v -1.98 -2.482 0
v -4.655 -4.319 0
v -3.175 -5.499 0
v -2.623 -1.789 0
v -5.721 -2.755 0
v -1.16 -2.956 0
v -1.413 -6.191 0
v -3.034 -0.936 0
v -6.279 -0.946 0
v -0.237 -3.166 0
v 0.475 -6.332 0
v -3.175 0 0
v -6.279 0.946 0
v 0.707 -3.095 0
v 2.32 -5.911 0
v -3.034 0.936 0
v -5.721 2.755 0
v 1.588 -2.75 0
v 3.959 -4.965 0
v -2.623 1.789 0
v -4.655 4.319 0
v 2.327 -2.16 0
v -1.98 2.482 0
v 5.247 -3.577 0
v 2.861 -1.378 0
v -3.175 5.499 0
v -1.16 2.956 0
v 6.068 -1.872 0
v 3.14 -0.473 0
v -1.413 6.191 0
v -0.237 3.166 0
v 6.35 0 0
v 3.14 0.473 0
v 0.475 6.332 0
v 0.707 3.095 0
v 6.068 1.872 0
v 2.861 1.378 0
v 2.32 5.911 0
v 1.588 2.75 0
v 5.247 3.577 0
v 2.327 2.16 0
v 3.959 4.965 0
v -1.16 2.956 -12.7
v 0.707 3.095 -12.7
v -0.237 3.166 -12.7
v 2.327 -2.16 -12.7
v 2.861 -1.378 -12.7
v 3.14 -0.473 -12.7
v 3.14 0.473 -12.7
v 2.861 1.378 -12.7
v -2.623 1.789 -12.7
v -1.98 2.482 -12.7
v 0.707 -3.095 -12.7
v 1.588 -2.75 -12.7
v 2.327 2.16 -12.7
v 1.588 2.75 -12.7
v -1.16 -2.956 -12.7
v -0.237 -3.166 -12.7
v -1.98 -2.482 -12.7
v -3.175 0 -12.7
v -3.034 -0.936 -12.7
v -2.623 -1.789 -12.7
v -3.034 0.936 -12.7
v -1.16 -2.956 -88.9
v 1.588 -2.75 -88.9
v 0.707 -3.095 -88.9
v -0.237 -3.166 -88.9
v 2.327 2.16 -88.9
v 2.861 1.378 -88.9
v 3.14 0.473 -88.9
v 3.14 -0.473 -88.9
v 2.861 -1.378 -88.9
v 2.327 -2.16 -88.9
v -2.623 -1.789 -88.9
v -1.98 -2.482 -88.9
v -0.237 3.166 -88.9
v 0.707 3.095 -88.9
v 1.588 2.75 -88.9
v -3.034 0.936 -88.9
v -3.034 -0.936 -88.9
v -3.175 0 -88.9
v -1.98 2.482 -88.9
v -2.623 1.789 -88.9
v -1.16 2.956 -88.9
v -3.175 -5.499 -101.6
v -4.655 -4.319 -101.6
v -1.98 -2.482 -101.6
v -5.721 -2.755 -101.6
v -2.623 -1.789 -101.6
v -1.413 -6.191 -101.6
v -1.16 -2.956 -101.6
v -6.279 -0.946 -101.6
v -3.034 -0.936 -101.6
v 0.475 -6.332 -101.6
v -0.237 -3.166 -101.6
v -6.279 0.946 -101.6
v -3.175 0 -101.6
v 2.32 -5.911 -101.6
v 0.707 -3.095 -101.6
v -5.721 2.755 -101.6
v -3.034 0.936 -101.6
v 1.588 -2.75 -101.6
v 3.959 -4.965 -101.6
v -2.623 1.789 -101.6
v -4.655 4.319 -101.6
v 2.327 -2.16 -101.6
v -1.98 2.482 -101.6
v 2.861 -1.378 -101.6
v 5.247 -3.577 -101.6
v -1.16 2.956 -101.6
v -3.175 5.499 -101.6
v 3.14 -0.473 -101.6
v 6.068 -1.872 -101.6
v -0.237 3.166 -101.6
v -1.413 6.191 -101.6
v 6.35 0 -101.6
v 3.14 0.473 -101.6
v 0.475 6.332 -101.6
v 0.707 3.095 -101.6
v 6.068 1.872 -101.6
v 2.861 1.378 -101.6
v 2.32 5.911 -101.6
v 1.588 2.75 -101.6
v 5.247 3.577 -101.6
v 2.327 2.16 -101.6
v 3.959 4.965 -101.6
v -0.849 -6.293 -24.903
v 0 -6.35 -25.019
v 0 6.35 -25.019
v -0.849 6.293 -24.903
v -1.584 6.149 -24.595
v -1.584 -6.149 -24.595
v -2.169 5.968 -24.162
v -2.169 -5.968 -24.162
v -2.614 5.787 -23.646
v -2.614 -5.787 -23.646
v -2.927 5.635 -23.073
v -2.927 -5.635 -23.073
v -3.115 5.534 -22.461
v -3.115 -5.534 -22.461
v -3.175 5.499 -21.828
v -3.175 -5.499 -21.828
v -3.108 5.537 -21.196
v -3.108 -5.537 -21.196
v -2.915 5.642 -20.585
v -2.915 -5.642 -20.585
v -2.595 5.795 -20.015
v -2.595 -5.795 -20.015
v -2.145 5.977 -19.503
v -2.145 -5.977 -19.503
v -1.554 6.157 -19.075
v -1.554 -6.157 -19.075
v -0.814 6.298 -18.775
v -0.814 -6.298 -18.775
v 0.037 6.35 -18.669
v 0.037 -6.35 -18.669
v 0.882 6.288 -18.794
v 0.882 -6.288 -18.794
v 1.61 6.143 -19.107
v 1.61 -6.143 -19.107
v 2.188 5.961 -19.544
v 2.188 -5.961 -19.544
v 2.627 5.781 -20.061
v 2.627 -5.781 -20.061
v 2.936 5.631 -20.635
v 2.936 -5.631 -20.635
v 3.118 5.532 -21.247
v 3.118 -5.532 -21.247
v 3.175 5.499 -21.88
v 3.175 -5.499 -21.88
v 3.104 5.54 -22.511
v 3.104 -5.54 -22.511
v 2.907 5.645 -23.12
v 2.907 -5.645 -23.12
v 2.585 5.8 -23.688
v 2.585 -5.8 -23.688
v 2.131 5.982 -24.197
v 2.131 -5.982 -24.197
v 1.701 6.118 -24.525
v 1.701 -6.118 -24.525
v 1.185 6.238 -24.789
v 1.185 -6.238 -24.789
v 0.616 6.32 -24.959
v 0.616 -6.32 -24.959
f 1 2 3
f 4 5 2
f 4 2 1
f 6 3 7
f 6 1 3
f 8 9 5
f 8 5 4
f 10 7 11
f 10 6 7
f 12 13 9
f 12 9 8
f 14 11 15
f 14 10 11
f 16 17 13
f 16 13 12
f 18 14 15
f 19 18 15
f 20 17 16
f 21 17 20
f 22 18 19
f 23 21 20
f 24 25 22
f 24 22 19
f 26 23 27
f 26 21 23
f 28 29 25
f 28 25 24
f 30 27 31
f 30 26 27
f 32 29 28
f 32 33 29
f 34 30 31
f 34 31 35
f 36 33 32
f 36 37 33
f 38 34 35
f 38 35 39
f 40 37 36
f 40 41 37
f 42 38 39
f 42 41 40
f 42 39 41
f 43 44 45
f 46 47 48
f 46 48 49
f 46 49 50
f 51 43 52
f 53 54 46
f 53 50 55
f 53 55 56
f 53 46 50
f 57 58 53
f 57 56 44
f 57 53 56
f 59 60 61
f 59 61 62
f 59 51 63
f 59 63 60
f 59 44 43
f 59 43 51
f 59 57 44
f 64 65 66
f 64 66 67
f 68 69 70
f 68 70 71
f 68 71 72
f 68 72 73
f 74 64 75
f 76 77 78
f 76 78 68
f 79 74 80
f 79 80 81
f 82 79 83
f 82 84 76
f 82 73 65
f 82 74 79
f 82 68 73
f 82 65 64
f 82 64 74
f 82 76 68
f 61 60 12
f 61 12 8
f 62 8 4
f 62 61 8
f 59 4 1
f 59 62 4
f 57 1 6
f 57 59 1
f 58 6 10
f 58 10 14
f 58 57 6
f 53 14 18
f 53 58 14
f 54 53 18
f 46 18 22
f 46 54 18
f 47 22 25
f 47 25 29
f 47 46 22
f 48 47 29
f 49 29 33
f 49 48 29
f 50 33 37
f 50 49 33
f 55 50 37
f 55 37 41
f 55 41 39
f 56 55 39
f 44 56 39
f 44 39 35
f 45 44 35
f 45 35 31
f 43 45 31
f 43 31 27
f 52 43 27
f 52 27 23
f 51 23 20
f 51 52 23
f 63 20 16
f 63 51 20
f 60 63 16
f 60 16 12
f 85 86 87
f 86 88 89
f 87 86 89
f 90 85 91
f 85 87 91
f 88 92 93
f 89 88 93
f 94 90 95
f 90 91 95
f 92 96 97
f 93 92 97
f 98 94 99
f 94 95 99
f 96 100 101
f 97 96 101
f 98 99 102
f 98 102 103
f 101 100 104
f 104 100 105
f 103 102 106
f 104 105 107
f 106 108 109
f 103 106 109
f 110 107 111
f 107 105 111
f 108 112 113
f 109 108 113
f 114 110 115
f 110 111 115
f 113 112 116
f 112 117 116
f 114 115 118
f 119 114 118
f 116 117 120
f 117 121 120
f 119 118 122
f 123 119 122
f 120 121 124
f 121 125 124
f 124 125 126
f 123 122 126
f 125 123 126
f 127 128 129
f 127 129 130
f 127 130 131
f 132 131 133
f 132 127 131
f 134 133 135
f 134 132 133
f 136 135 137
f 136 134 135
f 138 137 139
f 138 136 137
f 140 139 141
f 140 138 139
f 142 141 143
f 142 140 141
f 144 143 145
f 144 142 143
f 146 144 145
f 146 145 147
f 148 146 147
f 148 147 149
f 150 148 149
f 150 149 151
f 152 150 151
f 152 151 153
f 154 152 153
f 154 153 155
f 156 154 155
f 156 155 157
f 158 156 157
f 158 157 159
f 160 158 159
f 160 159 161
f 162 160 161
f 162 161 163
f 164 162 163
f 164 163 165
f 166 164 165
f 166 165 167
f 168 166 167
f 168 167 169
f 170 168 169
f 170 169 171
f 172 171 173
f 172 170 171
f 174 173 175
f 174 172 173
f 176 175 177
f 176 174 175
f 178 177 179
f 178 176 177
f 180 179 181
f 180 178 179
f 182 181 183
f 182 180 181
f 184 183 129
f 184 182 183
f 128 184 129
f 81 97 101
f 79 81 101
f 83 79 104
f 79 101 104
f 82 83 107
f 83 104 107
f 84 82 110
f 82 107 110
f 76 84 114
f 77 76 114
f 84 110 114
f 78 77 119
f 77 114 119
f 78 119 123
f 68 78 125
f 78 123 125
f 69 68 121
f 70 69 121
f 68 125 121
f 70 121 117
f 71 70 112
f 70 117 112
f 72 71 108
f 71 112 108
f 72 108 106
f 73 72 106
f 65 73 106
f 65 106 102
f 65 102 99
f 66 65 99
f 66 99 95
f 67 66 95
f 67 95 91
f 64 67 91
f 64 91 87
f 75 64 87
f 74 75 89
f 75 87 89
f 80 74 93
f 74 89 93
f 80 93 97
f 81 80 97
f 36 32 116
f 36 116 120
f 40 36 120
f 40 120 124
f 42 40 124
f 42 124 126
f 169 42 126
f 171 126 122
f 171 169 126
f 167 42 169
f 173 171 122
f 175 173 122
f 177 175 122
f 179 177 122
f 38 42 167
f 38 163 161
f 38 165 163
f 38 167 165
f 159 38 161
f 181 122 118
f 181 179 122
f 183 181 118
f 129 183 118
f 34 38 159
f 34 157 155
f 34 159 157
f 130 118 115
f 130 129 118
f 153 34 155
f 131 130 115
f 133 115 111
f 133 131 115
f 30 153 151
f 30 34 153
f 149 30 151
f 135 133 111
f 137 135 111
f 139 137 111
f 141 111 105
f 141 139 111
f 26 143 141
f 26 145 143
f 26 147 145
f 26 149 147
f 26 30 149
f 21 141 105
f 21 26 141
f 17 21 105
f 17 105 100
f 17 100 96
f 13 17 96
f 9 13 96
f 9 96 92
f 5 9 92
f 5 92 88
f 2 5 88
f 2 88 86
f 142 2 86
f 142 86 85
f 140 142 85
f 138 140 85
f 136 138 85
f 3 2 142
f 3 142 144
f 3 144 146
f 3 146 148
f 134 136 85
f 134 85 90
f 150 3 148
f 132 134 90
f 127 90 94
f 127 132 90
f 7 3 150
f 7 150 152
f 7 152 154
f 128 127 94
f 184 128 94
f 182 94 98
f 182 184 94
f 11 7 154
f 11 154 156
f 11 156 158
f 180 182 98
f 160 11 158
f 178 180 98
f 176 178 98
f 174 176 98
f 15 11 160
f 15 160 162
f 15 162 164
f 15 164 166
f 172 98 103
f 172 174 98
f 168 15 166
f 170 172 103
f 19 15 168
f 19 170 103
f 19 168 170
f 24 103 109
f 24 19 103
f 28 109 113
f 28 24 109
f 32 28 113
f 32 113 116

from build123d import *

# Parameters (mm, degrees)
SKETCH1_R               = 6.35
BOSS_EXTRUDE1_DEPTH     = 101.6
SKETCH7_R               = 3.175
CUT_EXTRUDE4_DEPTH      = 12.7
CUT_EXTRUDE5_DEPTH      = 7.62
CUT_EXTRUDE5_DEPTH_BACK = 8.636
SKETCH10_R              = 3.175
CUT_EXTRUDE6_START      = -12.7
SKETCH11_R              = 3.175
CUT_EXTRUDE6_DEPTH      = 12.7


with BuildPart() as part:
    # Sketch1 → Boss-Extrude1 (new body)
    with BuildSketch(Plane.XY):
        Circle(SKETCH1_R)
    extrude(amount=-BOSS_EXTRUDE1_DEPTH)

    # Sketch7 → Cut-Extrude4 (cut)
    with BuildSketch(Plane(origin=(0, 0, -101.6), x_dir=(-1, 0, 0), z_dir=(0, 0, -1))):
        Circle(SKETCH7_R)
    extrude(amount=-CUT_EXTRUDE4_DEPTH, mode=Mode.SUBTRACT)

    # Sketch10 → Cut-Extrude5 (cut, two sides: drawn at the far end of the back side and taken through both)
    with BuildSketch(Plane(origin=(0, 0, 0), x_dir=(1, 0, 0), z_dir=(0, 1, 0)).offset(-CUT_EXTRUDE5_DEPTH_BACK)):
        with Locations(Location((0, 21.844, 0), (0, 0, 90))):
            Circle(SKETCH10_R)
    extrude(amount=CUT_EXTRUDE5_DEPTH + CUT_EXTRUDE5_DEPTH_BACK, mode=Mode.SUBTRACT)

    # Sketch11 → Cut-Extrude6 (cut)
    with BuildSketch(Plane.XY.offset(CUT_EXTRUDE6_START)):
        with Locations(Location((0, 0, 0), (0, 0, 180))):
            Circle(SKETCH11_R)
    extrude(amount=CUT_EXTRUDE6_DEPTH, mode=Mode.SUBTRACT)


solid = part.part
